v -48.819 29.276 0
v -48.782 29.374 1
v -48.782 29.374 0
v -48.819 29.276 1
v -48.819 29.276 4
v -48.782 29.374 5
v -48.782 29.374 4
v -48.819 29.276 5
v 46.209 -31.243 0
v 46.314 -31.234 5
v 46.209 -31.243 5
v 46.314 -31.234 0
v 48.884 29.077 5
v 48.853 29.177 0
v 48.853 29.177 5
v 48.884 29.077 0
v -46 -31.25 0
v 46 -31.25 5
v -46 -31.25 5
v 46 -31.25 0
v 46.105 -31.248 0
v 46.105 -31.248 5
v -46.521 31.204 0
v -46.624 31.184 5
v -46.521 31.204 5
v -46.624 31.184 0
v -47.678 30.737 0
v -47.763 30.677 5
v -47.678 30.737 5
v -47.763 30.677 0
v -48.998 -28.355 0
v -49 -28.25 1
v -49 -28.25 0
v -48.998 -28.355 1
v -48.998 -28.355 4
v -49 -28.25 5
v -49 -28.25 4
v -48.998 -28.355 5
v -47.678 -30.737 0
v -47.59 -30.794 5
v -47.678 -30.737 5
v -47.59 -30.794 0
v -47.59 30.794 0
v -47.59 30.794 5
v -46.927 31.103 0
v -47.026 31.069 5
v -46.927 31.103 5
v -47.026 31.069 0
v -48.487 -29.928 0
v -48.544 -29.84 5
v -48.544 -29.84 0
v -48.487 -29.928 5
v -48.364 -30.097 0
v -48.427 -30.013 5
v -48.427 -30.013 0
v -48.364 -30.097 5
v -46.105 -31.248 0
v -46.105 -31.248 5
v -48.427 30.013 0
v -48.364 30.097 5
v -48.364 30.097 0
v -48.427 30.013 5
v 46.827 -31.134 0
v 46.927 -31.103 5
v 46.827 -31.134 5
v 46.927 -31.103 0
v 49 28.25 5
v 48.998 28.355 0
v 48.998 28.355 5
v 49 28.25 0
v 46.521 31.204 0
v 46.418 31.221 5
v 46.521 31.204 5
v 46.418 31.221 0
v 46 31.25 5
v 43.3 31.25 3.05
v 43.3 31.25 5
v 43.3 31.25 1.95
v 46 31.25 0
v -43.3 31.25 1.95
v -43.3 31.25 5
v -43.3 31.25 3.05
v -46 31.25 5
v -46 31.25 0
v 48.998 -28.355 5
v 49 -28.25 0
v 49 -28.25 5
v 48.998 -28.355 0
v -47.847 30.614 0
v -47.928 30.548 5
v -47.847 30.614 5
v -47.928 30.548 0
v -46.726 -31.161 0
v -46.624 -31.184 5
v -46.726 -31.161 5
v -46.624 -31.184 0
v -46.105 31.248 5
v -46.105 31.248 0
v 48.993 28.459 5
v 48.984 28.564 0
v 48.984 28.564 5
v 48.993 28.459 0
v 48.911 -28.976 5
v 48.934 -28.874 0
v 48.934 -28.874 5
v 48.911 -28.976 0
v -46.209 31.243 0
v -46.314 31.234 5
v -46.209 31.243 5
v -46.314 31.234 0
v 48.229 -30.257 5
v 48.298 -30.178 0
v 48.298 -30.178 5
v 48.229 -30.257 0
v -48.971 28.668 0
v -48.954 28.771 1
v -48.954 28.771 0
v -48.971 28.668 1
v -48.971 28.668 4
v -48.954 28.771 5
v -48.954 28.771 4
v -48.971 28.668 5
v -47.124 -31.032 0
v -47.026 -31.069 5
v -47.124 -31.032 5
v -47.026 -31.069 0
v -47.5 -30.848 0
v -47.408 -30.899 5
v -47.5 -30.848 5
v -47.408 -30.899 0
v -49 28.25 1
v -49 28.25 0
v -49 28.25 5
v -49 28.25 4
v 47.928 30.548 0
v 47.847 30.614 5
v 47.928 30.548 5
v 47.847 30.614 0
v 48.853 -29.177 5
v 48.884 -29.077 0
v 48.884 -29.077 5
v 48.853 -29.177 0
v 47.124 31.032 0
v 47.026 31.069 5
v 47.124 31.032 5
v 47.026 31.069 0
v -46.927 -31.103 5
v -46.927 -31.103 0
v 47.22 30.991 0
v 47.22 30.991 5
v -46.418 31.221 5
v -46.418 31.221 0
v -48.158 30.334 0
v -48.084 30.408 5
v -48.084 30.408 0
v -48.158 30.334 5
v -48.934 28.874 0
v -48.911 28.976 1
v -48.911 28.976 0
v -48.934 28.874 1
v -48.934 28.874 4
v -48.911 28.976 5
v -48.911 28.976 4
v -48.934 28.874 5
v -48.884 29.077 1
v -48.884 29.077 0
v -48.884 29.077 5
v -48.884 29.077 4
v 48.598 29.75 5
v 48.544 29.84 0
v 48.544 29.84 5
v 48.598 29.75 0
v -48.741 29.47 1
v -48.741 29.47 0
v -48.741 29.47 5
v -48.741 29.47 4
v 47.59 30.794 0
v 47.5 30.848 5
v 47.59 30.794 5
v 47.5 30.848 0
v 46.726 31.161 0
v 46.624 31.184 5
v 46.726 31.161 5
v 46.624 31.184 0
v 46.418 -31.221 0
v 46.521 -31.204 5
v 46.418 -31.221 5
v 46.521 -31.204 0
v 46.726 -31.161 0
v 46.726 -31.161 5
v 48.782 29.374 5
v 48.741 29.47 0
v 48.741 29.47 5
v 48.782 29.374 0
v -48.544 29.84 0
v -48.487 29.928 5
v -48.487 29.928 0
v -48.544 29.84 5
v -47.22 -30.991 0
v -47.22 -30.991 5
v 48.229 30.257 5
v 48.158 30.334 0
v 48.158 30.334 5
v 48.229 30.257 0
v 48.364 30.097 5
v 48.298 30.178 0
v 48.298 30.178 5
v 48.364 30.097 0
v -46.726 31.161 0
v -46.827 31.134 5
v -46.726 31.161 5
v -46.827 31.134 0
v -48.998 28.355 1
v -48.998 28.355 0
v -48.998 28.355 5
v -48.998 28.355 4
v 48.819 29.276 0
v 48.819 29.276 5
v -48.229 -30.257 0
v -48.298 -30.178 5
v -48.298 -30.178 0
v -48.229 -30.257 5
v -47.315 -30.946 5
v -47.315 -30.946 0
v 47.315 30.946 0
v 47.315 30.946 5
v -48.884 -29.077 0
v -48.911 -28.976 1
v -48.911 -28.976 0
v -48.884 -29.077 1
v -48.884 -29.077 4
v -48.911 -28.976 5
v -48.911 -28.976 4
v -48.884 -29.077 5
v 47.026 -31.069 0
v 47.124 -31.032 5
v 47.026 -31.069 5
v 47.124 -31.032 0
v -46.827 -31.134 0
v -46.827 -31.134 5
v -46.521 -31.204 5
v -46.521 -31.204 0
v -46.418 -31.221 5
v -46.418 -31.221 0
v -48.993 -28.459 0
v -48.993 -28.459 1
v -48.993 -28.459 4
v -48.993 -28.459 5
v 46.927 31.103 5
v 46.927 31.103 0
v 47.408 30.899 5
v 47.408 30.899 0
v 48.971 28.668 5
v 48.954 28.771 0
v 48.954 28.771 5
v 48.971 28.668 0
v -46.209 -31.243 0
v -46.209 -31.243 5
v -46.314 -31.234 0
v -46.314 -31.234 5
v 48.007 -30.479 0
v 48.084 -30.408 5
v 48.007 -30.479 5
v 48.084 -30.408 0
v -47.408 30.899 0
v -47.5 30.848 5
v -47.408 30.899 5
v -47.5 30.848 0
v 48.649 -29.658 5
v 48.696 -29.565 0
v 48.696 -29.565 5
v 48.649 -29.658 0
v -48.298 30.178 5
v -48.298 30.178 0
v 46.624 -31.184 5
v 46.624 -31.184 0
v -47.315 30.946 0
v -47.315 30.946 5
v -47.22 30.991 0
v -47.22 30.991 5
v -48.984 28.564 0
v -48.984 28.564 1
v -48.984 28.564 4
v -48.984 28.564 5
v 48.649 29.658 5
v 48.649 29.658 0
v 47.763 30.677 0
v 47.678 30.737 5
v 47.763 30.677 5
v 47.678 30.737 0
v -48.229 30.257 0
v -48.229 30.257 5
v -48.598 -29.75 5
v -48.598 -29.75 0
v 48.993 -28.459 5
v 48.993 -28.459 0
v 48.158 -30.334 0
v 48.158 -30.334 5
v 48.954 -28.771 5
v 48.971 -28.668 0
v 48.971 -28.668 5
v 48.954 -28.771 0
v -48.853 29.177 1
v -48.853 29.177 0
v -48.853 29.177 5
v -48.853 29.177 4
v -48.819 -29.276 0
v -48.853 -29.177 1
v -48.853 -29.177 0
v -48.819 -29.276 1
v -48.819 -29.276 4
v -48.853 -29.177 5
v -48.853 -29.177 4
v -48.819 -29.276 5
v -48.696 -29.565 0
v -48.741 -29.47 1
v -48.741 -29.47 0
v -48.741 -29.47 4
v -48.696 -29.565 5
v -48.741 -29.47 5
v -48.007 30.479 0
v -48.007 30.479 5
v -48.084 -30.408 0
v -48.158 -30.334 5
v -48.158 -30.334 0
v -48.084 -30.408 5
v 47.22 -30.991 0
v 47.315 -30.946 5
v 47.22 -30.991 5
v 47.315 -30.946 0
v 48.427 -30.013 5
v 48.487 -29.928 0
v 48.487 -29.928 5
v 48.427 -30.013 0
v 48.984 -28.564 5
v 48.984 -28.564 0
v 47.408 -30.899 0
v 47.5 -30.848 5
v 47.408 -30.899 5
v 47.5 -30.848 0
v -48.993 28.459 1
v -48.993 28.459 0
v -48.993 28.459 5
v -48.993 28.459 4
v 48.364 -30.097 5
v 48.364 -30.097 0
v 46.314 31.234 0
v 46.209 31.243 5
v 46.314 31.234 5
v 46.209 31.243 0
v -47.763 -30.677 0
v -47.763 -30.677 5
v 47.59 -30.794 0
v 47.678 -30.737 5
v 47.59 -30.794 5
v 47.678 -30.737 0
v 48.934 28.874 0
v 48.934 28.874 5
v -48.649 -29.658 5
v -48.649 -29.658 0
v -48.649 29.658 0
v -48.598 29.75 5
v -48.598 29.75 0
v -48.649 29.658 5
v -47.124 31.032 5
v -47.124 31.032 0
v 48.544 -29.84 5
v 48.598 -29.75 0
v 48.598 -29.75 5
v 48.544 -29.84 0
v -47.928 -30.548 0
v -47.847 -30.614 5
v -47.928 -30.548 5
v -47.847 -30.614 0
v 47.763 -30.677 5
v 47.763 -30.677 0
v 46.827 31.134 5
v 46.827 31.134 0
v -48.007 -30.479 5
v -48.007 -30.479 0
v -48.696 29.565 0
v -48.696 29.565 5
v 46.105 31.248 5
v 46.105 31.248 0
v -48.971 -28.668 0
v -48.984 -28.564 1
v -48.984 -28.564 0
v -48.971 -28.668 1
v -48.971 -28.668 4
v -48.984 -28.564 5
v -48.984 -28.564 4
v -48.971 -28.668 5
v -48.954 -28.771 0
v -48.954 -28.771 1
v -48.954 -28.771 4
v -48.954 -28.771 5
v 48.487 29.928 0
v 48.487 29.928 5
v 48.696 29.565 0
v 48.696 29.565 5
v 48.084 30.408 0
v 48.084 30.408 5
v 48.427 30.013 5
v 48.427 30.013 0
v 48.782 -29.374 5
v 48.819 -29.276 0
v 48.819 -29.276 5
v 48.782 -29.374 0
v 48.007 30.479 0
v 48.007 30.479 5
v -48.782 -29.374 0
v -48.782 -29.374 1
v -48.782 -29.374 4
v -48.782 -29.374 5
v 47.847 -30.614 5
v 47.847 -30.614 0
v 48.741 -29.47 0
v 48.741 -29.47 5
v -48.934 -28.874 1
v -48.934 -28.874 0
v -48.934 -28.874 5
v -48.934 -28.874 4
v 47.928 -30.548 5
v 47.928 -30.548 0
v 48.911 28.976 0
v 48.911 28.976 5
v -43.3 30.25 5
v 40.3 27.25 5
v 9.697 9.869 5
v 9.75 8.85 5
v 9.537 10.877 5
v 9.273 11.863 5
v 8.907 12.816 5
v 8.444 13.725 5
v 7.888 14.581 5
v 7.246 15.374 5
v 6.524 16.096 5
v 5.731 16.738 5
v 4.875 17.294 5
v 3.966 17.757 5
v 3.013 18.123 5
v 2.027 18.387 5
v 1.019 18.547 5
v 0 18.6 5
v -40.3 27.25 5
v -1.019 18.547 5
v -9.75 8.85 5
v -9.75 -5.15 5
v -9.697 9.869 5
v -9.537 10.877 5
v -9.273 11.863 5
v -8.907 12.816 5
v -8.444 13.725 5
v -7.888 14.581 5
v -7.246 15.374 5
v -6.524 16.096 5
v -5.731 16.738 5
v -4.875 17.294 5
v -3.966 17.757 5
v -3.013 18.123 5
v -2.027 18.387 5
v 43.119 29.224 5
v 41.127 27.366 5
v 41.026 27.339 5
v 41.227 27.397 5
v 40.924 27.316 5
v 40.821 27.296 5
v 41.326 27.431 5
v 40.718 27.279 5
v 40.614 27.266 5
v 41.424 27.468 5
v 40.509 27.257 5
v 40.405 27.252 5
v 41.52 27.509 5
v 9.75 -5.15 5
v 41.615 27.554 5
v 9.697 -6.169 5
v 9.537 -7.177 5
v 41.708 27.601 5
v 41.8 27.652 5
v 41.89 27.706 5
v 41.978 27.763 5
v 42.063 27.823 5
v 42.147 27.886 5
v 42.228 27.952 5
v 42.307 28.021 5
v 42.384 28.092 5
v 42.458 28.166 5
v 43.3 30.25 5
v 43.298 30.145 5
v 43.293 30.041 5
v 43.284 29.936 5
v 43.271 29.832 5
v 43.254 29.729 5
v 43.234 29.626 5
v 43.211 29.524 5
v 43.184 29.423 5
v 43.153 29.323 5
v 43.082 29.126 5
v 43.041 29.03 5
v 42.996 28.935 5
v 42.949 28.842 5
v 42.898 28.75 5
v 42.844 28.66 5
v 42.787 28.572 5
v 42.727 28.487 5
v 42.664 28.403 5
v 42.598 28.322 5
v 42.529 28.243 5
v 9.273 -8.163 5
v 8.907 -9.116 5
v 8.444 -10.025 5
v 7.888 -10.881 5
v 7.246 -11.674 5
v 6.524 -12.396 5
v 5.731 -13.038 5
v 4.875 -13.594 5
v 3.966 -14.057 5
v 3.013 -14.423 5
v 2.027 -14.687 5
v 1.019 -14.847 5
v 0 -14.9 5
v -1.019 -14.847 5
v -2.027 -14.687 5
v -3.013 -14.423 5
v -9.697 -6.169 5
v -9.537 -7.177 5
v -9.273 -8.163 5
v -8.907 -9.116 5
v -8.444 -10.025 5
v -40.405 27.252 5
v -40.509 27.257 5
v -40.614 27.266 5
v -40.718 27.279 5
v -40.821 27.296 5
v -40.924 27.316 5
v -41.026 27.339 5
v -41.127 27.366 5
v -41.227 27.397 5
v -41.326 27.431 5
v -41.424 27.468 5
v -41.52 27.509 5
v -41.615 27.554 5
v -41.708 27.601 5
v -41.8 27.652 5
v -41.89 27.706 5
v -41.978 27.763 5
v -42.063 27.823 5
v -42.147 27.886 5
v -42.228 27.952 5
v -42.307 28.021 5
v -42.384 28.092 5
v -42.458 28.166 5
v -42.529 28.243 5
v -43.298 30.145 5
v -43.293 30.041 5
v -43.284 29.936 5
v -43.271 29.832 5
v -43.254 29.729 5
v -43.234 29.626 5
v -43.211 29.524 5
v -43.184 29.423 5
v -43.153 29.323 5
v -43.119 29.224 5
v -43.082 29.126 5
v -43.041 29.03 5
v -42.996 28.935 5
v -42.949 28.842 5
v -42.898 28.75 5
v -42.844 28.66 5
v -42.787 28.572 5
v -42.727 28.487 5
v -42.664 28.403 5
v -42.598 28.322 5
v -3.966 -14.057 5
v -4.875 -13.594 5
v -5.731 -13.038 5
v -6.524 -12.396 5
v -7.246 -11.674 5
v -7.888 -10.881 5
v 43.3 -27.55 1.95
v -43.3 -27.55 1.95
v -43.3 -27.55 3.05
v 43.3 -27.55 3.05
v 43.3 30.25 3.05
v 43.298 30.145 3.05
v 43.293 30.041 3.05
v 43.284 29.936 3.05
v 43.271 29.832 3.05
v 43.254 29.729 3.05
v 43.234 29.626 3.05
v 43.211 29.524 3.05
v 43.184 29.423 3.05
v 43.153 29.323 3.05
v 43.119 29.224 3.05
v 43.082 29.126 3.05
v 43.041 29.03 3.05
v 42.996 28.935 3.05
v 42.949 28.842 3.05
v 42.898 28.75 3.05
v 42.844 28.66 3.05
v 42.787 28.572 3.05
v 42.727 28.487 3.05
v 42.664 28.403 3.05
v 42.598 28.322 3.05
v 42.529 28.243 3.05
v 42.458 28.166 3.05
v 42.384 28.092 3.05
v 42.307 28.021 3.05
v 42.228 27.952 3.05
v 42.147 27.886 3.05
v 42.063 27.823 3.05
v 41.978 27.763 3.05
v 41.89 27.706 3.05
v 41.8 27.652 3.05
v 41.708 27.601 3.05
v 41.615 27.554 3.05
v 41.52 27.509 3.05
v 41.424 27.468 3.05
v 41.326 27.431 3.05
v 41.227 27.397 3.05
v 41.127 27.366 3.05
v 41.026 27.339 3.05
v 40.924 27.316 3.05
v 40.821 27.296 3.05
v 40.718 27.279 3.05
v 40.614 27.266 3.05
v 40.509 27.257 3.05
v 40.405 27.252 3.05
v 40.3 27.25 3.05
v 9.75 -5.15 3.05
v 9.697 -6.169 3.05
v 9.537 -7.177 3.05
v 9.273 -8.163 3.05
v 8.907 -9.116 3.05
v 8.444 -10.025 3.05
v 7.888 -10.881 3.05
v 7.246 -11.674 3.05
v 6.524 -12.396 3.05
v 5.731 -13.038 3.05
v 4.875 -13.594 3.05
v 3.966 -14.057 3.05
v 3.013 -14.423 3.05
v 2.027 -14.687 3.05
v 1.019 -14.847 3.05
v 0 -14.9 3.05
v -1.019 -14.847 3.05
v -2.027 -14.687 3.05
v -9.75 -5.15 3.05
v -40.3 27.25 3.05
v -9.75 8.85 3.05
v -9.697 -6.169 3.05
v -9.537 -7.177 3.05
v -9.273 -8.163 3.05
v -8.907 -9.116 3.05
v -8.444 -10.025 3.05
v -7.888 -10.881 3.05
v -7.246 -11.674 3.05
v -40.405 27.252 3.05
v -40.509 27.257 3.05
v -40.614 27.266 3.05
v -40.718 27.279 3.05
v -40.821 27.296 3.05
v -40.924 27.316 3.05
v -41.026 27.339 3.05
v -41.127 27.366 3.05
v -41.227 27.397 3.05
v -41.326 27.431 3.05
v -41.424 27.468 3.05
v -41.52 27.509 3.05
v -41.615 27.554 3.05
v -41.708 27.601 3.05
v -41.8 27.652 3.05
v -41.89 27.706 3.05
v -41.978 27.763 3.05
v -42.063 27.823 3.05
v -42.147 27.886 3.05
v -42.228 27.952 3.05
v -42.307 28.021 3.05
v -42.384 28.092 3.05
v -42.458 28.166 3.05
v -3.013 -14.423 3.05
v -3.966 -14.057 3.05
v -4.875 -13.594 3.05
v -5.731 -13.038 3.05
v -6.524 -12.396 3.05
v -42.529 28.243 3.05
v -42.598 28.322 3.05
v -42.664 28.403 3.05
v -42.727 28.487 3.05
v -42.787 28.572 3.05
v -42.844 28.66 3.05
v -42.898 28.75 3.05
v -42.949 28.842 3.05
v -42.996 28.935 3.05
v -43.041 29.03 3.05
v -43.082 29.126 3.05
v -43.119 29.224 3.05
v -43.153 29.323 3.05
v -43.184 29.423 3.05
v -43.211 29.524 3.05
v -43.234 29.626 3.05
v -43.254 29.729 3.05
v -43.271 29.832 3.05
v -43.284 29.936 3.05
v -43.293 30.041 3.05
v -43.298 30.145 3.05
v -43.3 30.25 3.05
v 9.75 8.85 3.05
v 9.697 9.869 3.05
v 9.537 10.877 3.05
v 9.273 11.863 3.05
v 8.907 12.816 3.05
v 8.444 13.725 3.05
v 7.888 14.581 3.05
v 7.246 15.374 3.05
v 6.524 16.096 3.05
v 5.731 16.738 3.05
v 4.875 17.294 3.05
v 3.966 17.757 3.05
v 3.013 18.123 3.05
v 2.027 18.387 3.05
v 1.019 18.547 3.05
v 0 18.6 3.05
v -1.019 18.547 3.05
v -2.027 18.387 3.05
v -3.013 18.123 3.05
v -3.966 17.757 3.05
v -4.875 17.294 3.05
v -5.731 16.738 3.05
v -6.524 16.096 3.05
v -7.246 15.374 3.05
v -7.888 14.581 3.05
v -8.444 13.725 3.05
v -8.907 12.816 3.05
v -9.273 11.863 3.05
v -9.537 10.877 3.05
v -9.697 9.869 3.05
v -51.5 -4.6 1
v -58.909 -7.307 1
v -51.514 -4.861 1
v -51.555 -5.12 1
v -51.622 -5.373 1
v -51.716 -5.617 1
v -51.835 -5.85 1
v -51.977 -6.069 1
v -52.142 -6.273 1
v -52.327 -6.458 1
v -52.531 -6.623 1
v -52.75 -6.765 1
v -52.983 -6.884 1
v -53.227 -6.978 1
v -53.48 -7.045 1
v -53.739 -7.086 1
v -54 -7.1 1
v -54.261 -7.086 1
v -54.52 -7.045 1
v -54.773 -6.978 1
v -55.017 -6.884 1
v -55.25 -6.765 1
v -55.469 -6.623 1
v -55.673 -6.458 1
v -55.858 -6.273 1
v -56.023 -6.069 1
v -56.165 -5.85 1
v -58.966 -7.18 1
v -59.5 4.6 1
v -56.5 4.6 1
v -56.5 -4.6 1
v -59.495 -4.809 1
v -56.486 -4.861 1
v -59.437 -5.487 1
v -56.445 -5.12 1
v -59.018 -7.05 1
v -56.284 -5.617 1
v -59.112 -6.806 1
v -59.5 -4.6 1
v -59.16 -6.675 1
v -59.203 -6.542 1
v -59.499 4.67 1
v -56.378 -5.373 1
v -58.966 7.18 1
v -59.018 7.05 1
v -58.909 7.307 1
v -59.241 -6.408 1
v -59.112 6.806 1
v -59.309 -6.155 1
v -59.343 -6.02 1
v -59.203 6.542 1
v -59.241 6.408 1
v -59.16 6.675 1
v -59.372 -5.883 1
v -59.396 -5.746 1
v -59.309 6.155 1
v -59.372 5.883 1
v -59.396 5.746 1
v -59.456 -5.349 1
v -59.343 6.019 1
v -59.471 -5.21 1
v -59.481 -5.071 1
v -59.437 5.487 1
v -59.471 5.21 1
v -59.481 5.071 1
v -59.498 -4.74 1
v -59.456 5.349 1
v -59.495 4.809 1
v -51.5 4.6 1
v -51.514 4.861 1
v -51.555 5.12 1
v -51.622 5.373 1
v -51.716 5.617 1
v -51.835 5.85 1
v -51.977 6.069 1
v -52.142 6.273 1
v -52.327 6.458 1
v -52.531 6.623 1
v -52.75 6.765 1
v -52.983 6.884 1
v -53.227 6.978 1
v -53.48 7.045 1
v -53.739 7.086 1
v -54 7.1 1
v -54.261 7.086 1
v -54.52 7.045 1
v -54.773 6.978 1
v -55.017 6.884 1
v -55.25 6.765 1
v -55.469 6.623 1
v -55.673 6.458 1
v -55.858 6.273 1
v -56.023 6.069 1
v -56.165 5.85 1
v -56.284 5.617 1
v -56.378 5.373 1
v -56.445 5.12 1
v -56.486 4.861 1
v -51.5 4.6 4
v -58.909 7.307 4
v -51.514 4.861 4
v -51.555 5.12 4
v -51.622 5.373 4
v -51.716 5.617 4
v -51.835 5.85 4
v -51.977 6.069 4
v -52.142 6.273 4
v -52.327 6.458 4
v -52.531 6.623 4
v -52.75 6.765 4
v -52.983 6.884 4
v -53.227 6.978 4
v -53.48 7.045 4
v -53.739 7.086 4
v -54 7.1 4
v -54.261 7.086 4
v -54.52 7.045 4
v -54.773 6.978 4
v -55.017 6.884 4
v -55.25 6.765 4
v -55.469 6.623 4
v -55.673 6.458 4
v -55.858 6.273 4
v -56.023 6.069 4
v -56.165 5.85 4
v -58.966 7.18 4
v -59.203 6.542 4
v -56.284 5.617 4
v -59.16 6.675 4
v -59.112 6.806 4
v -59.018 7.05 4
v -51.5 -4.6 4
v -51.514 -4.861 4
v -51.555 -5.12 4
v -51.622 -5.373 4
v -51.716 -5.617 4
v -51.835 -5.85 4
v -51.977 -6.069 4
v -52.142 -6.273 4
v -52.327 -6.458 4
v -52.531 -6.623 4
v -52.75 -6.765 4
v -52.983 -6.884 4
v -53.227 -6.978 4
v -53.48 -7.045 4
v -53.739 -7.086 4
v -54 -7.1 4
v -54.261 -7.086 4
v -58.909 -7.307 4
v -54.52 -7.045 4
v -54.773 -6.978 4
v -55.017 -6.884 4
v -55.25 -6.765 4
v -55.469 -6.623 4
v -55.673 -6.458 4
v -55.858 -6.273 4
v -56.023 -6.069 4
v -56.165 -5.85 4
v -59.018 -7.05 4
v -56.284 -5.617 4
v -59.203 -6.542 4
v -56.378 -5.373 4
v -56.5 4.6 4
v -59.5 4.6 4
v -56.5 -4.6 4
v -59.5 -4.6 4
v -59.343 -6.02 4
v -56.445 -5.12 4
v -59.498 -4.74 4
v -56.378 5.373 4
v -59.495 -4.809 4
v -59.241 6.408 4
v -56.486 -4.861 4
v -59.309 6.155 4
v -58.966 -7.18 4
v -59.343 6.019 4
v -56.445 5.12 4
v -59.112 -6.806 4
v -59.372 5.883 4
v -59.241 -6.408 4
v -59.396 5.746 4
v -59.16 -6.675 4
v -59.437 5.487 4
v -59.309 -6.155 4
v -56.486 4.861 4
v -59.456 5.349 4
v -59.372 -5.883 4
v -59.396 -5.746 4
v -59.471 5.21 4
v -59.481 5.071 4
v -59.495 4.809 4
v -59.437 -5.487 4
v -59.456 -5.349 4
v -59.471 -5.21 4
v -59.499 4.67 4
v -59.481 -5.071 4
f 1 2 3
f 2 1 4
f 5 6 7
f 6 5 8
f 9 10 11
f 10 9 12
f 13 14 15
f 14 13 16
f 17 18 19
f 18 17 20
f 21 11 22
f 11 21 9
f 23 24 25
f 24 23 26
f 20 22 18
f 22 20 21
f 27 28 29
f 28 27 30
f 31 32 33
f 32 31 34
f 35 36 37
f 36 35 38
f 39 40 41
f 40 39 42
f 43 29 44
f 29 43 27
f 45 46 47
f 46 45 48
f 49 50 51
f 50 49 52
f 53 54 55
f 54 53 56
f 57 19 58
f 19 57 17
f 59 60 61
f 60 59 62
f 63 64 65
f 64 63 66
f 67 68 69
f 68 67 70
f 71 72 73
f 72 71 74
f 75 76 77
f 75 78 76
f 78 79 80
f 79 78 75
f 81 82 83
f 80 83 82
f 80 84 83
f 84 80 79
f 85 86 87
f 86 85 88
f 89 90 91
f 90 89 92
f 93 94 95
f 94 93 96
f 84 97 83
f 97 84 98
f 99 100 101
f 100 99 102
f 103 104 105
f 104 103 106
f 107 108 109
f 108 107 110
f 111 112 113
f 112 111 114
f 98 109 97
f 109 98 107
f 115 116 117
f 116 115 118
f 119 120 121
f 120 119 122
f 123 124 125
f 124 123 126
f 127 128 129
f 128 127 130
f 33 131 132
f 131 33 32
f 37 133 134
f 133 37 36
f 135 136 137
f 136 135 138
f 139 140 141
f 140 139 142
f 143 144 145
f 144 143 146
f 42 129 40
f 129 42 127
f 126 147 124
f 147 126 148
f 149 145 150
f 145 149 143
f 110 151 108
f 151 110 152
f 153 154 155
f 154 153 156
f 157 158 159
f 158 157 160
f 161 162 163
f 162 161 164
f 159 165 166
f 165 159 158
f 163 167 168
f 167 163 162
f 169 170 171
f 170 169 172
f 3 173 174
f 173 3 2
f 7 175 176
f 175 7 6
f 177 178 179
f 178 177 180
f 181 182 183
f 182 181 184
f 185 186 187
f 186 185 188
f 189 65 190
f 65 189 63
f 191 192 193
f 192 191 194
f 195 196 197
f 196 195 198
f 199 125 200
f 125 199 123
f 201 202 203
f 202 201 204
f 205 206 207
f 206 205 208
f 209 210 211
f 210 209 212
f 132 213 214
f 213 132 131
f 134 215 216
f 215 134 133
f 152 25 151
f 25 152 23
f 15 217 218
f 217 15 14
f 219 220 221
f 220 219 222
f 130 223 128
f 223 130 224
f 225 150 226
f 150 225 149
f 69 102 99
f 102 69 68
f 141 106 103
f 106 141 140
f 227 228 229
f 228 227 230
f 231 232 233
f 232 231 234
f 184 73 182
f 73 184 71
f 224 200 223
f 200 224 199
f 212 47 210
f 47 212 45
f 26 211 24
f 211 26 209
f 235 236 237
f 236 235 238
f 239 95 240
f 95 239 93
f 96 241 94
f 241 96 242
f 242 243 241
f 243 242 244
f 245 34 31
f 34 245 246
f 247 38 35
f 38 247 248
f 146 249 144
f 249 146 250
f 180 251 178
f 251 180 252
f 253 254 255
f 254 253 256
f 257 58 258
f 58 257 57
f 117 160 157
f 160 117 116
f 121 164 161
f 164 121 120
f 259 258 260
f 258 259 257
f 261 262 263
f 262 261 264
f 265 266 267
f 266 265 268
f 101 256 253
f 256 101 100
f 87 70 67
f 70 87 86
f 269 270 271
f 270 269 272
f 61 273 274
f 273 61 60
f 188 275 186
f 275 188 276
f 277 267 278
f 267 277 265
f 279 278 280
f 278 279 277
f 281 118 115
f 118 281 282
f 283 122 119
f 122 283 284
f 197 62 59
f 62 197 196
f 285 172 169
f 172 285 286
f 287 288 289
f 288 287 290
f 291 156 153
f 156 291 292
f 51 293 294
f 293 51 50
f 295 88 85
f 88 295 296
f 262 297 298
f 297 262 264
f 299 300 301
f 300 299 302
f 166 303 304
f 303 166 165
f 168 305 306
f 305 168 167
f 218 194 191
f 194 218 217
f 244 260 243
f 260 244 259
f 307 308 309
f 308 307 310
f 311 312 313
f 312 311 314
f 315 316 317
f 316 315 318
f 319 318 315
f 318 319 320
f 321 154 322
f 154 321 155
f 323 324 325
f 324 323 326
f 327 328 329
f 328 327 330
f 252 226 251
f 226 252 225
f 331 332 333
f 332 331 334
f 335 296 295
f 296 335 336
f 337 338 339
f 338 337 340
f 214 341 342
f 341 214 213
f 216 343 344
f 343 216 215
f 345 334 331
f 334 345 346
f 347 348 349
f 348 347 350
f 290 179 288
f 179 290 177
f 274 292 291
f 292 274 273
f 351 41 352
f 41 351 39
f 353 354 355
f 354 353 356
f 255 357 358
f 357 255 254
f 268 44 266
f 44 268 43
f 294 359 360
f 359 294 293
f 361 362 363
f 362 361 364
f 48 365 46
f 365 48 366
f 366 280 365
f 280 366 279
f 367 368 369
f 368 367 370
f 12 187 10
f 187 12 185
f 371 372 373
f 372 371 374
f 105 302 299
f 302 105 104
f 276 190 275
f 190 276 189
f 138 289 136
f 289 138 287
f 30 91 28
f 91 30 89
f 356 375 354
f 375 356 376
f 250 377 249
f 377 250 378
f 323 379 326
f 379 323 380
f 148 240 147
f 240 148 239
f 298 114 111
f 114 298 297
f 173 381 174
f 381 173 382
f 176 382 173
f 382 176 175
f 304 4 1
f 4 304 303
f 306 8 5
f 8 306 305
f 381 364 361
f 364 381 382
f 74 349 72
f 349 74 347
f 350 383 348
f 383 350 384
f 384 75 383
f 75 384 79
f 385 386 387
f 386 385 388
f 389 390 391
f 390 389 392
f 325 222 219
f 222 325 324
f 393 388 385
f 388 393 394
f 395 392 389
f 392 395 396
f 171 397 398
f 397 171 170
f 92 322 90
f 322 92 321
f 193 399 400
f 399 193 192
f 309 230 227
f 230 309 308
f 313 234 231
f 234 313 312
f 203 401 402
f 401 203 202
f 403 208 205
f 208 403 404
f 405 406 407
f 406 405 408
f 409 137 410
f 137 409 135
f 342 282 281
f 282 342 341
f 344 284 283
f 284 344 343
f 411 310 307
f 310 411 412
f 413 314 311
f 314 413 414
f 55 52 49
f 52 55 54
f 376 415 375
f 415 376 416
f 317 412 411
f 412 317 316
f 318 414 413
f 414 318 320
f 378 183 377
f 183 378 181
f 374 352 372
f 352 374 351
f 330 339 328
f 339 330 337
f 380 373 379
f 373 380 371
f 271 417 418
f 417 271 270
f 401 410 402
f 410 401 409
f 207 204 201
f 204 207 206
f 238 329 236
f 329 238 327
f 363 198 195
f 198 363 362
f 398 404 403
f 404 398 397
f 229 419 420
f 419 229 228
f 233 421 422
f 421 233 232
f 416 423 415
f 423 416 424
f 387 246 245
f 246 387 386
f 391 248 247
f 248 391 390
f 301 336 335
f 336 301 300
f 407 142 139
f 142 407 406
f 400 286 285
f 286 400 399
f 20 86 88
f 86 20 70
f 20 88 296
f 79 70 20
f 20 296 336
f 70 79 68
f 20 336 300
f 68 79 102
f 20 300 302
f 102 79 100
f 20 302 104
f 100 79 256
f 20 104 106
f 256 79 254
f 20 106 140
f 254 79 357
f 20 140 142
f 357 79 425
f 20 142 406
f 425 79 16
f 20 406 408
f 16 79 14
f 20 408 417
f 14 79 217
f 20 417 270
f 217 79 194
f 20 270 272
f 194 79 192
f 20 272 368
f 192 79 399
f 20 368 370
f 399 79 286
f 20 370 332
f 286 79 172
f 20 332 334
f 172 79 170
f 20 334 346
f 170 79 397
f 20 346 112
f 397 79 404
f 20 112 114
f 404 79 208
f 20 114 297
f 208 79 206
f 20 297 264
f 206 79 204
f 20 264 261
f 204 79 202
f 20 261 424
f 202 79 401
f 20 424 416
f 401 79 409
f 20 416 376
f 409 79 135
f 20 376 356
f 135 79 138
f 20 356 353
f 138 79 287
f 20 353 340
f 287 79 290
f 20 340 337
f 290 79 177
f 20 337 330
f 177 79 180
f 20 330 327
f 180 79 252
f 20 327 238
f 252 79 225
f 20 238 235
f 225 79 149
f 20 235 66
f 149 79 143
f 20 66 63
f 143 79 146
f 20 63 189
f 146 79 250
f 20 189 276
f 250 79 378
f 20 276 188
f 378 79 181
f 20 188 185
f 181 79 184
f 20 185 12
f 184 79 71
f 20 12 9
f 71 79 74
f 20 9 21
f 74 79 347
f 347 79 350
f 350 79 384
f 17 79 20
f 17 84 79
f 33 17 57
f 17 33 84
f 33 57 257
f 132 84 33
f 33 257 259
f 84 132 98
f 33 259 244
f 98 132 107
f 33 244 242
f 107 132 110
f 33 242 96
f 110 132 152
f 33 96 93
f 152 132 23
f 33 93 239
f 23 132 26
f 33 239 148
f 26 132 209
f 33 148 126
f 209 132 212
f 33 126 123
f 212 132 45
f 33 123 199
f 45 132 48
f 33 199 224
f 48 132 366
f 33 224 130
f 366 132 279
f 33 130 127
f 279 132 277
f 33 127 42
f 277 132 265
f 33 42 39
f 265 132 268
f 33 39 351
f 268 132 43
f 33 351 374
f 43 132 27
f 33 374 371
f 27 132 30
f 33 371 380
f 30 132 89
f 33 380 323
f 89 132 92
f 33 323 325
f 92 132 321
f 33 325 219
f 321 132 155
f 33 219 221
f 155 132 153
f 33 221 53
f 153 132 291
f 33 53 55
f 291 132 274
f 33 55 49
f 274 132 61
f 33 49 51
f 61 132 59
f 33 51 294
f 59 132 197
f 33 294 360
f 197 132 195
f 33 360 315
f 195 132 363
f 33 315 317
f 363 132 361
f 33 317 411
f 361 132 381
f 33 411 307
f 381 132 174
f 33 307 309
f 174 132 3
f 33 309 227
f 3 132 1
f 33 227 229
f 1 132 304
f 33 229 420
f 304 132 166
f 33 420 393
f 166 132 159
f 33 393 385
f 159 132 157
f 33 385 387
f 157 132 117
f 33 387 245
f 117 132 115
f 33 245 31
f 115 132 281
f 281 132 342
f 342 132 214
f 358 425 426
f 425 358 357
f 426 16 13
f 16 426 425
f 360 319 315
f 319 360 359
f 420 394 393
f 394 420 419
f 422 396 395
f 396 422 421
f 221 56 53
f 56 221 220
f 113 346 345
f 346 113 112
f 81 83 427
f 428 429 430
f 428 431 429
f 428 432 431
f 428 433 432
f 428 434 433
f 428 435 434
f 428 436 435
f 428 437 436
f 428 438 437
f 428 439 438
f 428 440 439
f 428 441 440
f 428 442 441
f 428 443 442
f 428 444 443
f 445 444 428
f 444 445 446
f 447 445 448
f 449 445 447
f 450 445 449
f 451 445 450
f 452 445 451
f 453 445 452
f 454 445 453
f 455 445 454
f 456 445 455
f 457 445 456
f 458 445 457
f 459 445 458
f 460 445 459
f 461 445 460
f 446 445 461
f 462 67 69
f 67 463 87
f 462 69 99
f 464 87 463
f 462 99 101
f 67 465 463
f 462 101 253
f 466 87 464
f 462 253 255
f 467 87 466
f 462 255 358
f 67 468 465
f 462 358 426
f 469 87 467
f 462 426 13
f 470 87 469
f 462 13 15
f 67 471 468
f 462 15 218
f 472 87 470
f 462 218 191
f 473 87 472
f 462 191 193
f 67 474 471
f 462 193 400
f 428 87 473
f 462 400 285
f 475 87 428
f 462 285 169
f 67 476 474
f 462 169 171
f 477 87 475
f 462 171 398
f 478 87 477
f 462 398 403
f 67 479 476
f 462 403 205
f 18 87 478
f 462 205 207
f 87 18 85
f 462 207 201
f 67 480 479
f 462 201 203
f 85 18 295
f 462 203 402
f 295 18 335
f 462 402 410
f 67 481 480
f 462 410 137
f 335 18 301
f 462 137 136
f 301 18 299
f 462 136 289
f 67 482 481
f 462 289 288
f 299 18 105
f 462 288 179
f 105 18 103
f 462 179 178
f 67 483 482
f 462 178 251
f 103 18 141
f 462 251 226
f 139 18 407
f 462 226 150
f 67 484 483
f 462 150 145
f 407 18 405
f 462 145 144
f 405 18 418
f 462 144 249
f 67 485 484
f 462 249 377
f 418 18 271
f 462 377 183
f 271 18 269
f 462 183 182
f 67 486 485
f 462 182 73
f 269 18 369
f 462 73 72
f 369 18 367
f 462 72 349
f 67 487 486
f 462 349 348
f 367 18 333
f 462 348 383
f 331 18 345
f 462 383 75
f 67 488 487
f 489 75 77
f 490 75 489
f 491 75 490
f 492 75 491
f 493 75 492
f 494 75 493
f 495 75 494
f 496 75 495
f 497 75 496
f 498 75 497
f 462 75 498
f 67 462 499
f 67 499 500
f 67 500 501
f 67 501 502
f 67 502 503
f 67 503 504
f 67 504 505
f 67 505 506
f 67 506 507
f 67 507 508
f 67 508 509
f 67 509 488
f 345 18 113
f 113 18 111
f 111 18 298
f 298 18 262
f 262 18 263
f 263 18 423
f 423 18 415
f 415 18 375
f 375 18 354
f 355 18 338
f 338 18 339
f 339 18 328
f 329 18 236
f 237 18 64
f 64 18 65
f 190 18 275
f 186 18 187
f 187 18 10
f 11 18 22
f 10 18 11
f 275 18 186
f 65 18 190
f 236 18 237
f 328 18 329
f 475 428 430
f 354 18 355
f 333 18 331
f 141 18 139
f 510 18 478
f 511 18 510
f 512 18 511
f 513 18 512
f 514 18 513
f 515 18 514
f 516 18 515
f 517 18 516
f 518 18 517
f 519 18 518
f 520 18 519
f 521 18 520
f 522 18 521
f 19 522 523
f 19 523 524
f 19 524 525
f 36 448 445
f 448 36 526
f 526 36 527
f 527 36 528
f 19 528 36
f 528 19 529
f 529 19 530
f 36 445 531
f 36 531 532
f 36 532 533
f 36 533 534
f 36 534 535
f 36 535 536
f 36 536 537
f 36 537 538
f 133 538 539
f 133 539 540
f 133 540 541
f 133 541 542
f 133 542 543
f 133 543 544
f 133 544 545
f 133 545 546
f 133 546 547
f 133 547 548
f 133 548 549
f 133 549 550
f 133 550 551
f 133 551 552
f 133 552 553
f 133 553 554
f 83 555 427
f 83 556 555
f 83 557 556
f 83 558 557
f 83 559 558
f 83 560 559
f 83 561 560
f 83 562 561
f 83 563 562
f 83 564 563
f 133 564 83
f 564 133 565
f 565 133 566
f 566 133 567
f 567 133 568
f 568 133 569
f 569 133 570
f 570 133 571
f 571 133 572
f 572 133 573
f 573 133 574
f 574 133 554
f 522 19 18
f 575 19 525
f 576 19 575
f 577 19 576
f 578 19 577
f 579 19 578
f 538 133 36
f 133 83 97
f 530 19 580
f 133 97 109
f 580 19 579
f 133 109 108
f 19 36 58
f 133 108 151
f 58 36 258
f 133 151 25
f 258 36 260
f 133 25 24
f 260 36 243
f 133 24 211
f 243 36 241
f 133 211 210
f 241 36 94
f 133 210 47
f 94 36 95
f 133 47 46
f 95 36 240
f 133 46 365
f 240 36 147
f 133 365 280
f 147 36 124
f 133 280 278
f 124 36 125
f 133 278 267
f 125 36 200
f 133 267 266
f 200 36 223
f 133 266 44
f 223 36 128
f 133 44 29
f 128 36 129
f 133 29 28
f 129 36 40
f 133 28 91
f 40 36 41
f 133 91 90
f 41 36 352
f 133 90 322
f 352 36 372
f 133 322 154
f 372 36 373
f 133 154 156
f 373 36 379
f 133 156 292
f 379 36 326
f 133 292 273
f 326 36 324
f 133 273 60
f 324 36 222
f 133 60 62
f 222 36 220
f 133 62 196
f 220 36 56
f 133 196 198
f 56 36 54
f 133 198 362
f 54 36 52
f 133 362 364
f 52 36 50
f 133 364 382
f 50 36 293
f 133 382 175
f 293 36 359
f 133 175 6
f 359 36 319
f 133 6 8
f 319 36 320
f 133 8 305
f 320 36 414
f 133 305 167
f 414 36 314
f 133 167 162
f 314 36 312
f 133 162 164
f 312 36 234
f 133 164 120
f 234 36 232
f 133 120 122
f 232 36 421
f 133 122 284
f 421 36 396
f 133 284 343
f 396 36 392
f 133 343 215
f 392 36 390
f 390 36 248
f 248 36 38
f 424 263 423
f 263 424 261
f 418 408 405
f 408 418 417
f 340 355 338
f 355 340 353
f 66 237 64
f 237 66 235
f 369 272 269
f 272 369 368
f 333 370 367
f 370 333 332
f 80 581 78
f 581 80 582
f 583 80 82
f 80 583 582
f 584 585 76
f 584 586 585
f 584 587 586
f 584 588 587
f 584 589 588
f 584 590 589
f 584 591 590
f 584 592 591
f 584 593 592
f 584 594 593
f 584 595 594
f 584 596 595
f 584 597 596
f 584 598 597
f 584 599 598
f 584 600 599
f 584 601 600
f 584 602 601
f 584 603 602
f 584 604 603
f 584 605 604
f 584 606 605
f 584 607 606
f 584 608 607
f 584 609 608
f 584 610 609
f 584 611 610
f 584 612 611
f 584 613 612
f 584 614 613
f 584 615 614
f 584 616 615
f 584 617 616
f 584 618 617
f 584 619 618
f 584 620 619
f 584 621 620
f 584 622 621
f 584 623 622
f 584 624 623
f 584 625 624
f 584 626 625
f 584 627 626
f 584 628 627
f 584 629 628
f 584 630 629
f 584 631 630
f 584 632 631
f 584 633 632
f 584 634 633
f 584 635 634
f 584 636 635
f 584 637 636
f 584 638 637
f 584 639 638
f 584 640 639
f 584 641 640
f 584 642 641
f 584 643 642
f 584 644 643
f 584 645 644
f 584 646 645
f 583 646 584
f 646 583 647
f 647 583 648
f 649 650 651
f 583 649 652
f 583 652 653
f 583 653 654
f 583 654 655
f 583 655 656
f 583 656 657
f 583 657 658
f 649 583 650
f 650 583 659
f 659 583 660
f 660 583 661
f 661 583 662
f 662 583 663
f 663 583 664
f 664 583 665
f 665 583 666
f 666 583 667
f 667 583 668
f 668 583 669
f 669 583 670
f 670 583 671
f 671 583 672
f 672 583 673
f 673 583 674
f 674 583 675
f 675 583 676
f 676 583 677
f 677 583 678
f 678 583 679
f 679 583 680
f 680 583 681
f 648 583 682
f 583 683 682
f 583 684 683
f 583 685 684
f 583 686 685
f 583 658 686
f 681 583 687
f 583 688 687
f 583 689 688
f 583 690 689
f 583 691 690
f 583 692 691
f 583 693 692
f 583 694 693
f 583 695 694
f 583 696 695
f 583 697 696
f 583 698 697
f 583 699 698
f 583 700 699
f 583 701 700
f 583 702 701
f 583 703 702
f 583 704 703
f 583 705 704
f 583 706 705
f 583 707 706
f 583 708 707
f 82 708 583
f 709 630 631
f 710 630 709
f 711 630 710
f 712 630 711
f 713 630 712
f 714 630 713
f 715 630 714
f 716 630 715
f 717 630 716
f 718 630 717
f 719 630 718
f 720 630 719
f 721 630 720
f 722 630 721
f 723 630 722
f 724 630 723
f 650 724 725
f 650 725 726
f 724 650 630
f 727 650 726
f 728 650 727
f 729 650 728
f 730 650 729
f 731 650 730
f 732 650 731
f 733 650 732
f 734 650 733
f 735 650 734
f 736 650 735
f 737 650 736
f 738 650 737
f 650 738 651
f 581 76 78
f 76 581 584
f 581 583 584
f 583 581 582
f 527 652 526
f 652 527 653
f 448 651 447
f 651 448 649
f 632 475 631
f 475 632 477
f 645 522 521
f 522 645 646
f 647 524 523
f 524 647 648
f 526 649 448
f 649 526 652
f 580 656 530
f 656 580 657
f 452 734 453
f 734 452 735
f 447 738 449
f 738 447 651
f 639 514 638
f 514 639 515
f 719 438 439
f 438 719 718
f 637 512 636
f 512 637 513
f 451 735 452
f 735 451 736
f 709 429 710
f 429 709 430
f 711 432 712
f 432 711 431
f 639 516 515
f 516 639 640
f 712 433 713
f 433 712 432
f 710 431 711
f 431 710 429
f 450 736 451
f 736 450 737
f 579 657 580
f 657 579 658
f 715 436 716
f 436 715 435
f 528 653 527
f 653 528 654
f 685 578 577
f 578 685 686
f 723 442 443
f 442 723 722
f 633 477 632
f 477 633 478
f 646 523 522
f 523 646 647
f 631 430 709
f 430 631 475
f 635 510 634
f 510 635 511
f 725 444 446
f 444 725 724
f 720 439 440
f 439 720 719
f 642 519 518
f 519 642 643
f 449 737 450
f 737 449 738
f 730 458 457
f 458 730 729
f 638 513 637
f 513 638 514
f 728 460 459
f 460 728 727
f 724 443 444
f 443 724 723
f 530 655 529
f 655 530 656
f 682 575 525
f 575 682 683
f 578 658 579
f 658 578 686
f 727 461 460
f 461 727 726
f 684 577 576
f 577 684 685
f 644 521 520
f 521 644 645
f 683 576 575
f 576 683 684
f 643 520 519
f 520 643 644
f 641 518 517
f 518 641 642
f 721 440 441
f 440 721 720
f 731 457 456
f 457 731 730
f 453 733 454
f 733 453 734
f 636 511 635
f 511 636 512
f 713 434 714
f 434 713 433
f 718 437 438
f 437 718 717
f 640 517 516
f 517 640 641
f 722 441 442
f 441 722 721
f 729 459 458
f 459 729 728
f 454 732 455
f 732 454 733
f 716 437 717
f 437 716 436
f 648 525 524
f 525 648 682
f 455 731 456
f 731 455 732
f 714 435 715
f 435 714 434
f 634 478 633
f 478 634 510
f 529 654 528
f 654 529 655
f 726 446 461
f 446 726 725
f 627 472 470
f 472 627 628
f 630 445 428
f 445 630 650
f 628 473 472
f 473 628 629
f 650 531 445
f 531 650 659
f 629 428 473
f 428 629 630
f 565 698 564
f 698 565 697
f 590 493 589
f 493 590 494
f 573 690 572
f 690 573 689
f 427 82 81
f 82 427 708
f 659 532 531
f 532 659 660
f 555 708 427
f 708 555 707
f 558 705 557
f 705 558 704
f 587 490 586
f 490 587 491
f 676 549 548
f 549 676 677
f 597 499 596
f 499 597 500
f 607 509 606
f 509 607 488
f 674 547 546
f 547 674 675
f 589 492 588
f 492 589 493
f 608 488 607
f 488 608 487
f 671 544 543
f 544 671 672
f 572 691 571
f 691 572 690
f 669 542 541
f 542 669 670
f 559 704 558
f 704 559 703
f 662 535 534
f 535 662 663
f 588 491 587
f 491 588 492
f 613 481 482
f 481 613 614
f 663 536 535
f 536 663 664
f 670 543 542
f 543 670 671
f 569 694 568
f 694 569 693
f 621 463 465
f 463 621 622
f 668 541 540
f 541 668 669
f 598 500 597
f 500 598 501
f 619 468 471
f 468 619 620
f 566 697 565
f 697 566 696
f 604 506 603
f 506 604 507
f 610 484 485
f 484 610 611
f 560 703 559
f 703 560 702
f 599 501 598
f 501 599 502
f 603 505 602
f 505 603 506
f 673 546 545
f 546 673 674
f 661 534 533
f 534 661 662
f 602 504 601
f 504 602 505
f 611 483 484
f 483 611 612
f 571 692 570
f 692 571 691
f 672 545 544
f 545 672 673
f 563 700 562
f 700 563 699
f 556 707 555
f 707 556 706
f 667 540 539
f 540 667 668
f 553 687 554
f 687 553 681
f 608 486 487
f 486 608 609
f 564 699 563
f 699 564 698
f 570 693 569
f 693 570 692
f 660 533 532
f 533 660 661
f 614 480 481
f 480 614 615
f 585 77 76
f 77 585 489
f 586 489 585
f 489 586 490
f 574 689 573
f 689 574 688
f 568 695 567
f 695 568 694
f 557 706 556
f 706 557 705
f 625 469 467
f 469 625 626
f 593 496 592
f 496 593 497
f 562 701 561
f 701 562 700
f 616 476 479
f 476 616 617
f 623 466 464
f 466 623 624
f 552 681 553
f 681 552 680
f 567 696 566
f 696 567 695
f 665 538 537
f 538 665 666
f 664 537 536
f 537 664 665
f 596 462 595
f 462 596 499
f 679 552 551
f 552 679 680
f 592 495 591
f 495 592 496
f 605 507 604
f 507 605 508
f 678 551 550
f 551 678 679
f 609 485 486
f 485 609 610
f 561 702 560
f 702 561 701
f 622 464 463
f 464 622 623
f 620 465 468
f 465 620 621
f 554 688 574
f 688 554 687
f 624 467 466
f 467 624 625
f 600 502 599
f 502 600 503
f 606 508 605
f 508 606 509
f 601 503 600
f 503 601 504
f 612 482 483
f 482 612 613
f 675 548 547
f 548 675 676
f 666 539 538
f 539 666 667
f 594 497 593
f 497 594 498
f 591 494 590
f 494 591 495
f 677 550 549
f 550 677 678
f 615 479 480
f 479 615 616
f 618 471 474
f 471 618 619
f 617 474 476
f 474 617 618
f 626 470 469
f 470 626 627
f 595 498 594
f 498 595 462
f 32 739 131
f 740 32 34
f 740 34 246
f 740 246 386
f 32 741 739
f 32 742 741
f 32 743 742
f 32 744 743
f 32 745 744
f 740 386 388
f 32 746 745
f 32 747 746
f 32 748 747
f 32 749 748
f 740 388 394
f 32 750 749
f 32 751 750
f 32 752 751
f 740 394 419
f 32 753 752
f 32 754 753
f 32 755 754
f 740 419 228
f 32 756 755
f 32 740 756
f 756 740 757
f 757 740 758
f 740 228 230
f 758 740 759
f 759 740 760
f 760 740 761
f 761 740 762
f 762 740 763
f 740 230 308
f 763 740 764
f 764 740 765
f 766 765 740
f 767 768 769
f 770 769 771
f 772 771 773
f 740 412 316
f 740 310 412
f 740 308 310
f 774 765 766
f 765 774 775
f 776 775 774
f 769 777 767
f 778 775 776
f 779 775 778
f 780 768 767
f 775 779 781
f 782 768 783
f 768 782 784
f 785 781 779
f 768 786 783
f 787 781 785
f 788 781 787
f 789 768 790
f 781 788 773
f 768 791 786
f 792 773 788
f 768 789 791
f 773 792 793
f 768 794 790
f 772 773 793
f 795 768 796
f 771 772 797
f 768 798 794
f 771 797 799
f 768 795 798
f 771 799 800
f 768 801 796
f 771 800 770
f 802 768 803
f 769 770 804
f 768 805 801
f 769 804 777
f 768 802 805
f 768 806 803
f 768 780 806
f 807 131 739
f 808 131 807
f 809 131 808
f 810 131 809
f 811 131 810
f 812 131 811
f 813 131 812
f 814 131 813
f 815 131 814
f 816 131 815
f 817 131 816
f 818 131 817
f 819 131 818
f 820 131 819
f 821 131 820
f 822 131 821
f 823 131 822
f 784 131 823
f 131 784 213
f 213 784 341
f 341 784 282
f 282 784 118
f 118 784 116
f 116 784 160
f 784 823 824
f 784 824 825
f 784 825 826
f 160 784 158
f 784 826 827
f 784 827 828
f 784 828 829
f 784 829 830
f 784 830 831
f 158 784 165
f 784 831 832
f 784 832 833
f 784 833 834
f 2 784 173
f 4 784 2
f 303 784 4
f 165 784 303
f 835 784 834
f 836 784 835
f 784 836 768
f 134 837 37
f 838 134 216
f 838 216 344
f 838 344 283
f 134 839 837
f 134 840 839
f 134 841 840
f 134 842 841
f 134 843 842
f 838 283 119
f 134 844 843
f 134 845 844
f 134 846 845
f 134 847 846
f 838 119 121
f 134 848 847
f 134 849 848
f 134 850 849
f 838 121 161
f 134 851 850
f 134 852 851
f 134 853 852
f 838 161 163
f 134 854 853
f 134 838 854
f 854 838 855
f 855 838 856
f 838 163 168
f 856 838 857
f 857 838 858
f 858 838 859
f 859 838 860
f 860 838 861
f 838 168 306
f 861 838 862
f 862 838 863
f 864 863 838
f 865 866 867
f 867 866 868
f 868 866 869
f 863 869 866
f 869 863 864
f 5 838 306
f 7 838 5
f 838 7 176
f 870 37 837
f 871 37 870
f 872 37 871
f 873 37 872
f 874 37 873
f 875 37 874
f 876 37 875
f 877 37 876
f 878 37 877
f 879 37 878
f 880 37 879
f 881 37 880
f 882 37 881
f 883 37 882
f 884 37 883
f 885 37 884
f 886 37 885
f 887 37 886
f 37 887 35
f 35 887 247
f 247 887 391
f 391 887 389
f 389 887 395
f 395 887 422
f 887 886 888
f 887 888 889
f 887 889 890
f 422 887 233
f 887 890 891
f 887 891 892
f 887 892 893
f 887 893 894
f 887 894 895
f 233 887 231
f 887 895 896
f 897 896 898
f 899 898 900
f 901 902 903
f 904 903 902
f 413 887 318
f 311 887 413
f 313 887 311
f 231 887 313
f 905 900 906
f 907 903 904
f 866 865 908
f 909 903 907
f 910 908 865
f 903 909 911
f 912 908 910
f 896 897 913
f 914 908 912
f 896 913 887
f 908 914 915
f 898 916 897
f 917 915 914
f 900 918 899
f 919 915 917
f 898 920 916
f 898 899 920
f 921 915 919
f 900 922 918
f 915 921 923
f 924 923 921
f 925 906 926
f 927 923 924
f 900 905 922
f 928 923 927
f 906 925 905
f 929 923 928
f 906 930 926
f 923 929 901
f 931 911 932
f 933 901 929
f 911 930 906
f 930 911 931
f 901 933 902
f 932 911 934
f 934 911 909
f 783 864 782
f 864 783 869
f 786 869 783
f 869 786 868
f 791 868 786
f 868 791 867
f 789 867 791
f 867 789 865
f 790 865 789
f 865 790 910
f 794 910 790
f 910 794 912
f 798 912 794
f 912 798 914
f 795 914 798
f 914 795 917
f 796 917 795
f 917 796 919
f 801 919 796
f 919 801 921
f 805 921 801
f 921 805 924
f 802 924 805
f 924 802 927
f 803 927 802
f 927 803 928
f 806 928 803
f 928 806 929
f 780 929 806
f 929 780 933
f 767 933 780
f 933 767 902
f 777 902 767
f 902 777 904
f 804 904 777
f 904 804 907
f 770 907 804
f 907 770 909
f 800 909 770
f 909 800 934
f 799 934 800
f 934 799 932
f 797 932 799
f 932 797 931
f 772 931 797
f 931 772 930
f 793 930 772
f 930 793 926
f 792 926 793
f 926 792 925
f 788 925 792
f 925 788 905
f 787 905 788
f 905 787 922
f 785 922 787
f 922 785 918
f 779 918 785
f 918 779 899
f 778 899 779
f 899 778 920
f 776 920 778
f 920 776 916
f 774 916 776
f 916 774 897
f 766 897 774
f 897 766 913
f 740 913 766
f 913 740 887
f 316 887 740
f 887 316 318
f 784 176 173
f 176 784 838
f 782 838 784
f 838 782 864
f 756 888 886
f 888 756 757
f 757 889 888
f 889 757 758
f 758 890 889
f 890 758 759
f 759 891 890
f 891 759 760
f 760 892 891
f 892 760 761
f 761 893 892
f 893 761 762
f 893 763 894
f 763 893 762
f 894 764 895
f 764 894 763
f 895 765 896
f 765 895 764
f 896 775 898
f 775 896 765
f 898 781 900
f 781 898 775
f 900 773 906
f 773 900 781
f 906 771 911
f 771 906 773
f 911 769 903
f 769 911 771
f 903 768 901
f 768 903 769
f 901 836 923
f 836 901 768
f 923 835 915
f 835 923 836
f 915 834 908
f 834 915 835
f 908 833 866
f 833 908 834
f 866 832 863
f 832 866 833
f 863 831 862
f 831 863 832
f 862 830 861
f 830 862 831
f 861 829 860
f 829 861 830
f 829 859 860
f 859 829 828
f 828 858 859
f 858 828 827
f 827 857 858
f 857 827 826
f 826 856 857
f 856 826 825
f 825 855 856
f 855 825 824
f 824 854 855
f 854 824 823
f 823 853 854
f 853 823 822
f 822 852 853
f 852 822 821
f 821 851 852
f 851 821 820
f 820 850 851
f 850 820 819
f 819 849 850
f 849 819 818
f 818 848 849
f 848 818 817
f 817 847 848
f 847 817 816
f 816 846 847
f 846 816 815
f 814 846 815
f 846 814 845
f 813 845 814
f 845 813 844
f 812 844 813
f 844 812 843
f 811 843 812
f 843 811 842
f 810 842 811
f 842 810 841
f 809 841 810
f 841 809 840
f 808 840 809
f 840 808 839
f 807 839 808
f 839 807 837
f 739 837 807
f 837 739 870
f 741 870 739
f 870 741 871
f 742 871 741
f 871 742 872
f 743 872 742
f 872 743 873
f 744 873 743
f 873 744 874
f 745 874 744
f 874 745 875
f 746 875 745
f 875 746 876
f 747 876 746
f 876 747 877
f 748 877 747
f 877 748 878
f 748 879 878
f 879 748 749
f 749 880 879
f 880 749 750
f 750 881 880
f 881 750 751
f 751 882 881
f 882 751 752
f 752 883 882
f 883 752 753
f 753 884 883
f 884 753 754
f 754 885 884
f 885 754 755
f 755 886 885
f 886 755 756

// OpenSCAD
/* Andrew C Mattson
// CS F453 HW0
// Card Holder
//
// Notes:
// I have many modules that build on one
// beginning rectangle. I think I should have
// instead had many modules for the different
// holes and shapes, then joined them together
// in one module (to an extent; the ring
// attachment would be one part made up of
// multiple that would be entirely built
// separately and then unioned later, etc.).
*/

$fs=0.1;
$fa=2;

holderRounding = 3;
sliceRounding = 3;

fingerGapDia = 19.5;
fingerGapLen = 33.5-fingerGapDia;

cardSlotDims = [ // l,w,h
    86.6,
    53.8+5.0, // card rests 5mm inside of holder
    1.1,
];

ringHoleOffset=0;
ringHoleDia=5.0;
ringHoleLen=14.2-ringHoleDia;
ringWallThick=4.0;
ringAttachThick=3;

rimSliceDims = [
    cardSlotDims[0],
    4.0+sliceRounding
];

cardHolderDims = [ // l,w,h
    98.0, 
    62.5,
    5.0
];

module wantRect(l, w) {
    translate([-l/2,-w/2,0])
        square([l, w]);
}

module wantCirc(s) {
    circle(d=s,$fn=60);
}

module cardSlot2D() {
    wantRect(cardSlotDims[0], cardSlotDims[1]);
}

module cardSlot() {
    linear_extrude(height=cardSlotDims[2], convexity=4)
        cardSlot2D();
}

module cardHolder2D() {
    wantRect(cardHolderDims[0], cardHolderDims[1]);
}

module roundedCardHolder2D() {
    offset(r=holderRounding)
    offset(r=-holderRounding)
    cardHolder2D();
}

module cardHolder() {
    linear_extrude(height=cardHolderDims[2], convexity=4)
        roundedCardHolder2D();
}


cardElev=cardHolderDims[2]/2-cardSlotDims[2]/2;
cardOffset=(cardHolderDims[1]-cardSlotDims[1])/2;
module slottedHolder() {
    difference() {
        cardHolder();
        translate([0,cardOffset,cardElev])
            #cardSlot();
    }
}

module fingerGap2D() {
    hull() {
        translate([0,fingerGapLen/2,0])
        wantCirc(fingerGapDia);
        translate([0,-fingerGapLen/2,0])
        wantCirc(fingerGapDia);
    }

}

module fingerGap() {
    linear_extrude(height=cardHolderDims[2]/2, convexity=4)
        fingerGap2D();
}

module fingerGappedHolder() {
    difference() {
        slottedHolder();
        translate([0,cardOffset,cardHolderDims[2]/2])
        fingerGap();
    }
}

module rimSlice2D() {
    translate([0,cardHolderDims[1]/2-rimSliceDims[1]/2+sliceRounding,0])
    wantRect(rimSliceDims[0], rimSliceDims[1]);
}

module rimSlice() {
    translate([0,0,cardHolderDims[2]/2+cardSlotDims[2]/2])
    linear_extrude(height=cardHolderDims[2]/2, convexity=4)
        offset(r=sliceRounding) 
        offset(r=-sliceRounding)
        rimSlice2D();
}

module slicedCardHolder() {
    difference() {
        fingerGappedHolder();
        #rimSlice();
    }
}

module ringHole2D() {
    hull() {
        translate([0,ringHoleLen/2,0])
        wantCirc(ringHoleDia);
        translate([0,-ringHoleLen/2,0])
        wantCirc(ringHoleDia);
    }
}


module ringAttachment2D() {
    difference() {
    difference() {
        hull() {
            roundedCardHolder2D();
            translate([-cardHolderDims[0]/2-ringWallThick-ringHoleOffset,0,0])
            offset(r=ringWallThick)
            ringHole2D();
        }
        translate([-cardHolderDims[0]/2-ringHoleOffset-ringHoleDia,0,0])
        ringHole2D();
    }
    roundedCardHolder2D();
    }
}

module ringAttachment() {
    translate([0,0,cardHolderDims[2]/2-ringAttachThick/2])
    linear_extrude(height=ringAttachThick, convexity=4)
        ringAttachment2D();
}

union() {
slicedCardHolder();
ringAttachment();
}
